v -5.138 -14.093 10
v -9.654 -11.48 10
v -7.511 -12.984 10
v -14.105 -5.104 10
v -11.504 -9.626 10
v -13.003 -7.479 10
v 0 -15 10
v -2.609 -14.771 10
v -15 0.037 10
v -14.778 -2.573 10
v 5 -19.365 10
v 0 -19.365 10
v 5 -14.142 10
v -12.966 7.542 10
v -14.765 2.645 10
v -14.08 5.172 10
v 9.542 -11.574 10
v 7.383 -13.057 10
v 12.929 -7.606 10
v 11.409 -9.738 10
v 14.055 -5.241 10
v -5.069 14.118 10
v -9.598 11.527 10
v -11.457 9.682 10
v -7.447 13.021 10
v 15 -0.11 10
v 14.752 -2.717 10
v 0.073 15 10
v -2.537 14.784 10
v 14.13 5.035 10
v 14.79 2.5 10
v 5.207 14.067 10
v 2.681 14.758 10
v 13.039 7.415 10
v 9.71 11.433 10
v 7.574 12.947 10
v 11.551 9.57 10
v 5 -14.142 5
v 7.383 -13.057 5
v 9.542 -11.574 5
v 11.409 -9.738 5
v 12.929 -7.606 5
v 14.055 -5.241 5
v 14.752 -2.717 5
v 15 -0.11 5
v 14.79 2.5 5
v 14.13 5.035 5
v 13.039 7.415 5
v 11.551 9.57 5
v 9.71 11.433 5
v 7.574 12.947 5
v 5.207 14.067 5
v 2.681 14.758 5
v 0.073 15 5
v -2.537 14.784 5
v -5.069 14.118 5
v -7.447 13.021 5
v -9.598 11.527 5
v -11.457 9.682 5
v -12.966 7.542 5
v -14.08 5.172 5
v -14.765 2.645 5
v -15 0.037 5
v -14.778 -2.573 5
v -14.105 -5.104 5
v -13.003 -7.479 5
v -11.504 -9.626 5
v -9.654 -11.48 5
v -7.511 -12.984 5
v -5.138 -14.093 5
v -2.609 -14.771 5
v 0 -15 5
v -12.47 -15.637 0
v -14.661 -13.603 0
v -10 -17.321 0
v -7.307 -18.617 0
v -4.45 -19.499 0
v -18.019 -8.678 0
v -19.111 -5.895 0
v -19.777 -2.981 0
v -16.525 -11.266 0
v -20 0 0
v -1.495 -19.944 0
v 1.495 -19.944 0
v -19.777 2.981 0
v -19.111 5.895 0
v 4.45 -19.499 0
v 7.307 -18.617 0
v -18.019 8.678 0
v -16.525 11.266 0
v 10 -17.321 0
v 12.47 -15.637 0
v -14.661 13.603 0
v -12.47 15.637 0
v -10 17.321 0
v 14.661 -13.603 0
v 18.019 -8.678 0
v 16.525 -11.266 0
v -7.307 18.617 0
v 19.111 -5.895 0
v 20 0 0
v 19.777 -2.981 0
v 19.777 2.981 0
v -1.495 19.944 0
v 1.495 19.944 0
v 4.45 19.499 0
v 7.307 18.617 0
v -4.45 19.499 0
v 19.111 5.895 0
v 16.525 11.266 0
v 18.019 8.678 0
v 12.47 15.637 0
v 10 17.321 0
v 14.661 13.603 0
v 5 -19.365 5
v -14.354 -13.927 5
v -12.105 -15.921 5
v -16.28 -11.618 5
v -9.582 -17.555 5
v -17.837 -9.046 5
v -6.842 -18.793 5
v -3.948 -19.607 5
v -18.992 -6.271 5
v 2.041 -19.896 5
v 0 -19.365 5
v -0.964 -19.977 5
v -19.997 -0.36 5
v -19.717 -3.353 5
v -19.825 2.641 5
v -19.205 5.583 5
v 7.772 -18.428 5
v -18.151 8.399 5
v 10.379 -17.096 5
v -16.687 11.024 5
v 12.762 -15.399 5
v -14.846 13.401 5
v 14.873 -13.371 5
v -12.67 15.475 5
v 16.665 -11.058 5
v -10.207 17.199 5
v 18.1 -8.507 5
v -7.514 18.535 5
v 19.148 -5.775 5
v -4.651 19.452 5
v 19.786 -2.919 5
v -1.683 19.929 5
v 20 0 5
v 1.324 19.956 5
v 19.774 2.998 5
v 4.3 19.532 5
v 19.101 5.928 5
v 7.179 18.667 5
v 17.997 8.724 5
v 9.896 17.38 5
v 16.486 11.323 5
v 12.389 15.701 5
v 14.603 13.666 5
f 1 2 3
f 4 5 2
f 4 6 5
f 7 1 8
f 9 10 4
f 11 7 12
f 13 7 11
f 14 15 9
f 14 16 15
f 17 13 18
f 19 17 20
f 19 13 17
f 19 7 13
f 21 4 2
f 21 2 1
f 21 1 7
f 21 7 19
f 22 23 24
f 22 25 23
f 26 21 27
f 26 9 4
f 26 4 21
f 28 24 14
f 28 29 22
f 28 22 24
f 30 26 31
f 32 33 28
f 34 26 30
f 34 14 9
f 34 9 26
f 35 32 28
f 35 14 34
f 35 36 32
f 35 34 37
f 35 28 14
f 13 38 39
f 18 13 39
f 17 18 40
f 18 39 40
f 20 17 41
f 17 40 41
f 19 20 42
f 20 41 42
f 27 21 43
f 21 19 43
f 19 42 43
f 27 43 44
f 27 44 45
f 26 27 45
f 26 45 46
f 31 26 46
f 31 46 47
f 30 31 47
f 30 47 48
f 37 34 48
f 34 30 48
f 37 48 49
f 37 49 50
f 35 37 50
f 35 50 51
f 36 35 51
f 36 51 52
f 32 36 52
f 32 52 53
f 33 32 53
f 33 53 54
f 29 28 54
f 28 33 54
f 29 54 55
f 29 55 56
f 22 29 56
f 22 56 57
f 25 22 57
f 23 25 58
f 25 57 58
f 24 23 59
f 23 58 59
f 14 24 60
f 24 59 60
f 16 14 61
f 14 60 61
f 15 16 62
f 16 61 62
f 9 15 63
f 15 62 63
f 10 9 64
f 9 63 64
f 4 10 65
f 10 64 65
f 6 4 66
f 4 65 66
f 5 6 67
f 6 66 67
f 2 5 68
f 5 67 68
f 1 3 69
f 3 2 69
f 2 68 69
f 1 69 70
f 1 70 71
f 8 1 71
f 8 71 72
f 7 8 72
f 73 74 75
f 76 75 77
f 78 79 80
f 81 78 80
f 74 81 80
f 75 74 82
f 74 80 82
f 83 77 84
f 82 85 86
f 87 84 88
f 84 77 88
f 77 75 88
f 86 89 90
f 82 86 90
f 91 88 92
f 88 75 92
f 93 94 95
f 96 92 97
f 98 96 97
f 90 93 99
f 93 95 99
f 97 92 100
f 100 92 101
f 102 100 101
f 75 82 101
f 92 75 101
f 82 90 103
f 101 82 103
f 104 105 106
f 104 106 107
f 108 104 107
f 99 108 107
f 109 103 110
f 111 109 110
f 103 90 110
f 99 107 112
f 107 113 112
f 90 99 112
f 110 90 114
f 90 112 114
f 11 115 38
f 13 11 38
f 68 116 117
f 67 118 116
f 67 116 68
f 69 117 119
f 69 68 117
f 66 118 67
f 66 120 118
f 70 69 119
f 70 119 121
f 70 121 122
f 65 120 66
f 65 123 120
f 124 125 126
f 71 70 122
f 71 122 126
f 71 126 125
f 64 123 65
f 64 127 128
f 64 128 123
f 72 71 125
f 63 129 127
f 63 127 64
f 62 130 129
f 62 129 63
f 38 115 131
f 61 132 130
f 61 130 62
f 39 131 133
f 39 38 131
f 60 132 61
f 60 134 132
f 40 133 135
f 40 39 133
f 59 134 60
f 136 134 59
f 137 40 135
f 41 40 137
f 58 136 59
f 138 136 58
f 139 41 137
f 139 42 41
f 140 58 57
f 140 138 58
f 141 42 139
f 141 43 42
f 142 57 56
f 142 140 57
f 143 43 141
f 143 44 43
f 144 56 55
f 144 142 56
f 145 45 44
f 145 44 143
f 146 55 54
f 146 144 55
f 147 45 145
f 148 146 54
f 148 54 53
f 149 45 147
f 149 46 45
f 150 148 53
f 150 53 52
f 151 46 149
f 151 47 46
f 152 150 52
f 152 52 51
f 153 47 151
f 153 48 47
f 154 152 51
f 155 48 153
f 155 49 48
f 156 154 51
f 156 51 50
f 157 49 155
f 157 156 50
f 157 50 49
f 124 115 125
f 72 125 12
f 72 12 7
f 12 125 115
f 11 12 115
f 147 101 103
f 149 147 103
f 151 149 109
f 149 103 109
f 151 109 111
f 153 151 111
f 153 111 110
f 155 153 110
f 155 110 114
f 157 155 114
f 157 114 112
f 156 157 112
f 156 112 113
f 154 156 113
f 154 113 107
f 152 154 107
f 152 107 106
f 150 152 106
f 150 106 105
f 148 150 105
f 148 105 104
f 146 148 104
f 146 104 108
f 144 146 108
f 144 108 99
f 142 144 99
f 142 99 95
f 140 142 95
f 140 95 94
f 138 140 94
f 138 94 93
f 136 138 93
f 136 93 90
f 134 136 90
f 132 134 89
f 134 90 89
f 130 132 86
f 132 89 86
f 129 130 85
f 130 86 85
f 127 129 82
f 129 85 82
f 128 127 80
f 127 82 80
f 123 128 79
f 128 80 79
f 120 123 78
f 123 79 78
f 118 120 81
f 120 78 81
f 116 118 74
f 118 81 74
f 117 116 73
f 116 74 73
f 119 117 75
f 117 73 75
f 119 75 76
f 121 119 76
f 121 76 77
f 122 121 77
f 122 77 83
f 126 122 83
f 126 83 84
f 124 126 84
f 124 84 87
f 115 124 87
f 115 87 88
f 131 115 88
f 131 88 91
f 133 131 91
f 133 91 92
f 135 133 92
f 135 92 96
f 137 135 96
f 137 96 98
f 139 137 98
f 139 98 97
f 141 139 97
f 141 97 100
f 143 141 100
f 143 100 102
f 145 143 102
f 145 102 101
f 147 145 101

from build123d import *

# Parameters (mm, degrees)
F0_R     = 20
F1_DEPTH = 5
F2_R     = 15
F3_DEPTH = 5
F4_W     = 5
F4_H     = 19.364917
F5_DEPTH = 5


with BuildPart() as f1:
    # F0 (on Top) → F1 (new body)
    with BuildSketch(Plane.XY):
        Circle(F0_R)
    extrude(amount=F1_DEPTH)

    # F2 (on face) → F3 (join)
    with BuildSketch(Plane.XY.offset(5)):
        Circle(F2_R)
    extrude(amount=F3_DEPTH)

    # F4 (on face) → F5 (join)
    with BuildSketch(Plane.XY.offset(5)):
        with Locations((2.5, -9.682458)):
            Rectangle(F4_W, F4_H)
    extrude(amount=F5_DEPTH)


solid = f1.part
